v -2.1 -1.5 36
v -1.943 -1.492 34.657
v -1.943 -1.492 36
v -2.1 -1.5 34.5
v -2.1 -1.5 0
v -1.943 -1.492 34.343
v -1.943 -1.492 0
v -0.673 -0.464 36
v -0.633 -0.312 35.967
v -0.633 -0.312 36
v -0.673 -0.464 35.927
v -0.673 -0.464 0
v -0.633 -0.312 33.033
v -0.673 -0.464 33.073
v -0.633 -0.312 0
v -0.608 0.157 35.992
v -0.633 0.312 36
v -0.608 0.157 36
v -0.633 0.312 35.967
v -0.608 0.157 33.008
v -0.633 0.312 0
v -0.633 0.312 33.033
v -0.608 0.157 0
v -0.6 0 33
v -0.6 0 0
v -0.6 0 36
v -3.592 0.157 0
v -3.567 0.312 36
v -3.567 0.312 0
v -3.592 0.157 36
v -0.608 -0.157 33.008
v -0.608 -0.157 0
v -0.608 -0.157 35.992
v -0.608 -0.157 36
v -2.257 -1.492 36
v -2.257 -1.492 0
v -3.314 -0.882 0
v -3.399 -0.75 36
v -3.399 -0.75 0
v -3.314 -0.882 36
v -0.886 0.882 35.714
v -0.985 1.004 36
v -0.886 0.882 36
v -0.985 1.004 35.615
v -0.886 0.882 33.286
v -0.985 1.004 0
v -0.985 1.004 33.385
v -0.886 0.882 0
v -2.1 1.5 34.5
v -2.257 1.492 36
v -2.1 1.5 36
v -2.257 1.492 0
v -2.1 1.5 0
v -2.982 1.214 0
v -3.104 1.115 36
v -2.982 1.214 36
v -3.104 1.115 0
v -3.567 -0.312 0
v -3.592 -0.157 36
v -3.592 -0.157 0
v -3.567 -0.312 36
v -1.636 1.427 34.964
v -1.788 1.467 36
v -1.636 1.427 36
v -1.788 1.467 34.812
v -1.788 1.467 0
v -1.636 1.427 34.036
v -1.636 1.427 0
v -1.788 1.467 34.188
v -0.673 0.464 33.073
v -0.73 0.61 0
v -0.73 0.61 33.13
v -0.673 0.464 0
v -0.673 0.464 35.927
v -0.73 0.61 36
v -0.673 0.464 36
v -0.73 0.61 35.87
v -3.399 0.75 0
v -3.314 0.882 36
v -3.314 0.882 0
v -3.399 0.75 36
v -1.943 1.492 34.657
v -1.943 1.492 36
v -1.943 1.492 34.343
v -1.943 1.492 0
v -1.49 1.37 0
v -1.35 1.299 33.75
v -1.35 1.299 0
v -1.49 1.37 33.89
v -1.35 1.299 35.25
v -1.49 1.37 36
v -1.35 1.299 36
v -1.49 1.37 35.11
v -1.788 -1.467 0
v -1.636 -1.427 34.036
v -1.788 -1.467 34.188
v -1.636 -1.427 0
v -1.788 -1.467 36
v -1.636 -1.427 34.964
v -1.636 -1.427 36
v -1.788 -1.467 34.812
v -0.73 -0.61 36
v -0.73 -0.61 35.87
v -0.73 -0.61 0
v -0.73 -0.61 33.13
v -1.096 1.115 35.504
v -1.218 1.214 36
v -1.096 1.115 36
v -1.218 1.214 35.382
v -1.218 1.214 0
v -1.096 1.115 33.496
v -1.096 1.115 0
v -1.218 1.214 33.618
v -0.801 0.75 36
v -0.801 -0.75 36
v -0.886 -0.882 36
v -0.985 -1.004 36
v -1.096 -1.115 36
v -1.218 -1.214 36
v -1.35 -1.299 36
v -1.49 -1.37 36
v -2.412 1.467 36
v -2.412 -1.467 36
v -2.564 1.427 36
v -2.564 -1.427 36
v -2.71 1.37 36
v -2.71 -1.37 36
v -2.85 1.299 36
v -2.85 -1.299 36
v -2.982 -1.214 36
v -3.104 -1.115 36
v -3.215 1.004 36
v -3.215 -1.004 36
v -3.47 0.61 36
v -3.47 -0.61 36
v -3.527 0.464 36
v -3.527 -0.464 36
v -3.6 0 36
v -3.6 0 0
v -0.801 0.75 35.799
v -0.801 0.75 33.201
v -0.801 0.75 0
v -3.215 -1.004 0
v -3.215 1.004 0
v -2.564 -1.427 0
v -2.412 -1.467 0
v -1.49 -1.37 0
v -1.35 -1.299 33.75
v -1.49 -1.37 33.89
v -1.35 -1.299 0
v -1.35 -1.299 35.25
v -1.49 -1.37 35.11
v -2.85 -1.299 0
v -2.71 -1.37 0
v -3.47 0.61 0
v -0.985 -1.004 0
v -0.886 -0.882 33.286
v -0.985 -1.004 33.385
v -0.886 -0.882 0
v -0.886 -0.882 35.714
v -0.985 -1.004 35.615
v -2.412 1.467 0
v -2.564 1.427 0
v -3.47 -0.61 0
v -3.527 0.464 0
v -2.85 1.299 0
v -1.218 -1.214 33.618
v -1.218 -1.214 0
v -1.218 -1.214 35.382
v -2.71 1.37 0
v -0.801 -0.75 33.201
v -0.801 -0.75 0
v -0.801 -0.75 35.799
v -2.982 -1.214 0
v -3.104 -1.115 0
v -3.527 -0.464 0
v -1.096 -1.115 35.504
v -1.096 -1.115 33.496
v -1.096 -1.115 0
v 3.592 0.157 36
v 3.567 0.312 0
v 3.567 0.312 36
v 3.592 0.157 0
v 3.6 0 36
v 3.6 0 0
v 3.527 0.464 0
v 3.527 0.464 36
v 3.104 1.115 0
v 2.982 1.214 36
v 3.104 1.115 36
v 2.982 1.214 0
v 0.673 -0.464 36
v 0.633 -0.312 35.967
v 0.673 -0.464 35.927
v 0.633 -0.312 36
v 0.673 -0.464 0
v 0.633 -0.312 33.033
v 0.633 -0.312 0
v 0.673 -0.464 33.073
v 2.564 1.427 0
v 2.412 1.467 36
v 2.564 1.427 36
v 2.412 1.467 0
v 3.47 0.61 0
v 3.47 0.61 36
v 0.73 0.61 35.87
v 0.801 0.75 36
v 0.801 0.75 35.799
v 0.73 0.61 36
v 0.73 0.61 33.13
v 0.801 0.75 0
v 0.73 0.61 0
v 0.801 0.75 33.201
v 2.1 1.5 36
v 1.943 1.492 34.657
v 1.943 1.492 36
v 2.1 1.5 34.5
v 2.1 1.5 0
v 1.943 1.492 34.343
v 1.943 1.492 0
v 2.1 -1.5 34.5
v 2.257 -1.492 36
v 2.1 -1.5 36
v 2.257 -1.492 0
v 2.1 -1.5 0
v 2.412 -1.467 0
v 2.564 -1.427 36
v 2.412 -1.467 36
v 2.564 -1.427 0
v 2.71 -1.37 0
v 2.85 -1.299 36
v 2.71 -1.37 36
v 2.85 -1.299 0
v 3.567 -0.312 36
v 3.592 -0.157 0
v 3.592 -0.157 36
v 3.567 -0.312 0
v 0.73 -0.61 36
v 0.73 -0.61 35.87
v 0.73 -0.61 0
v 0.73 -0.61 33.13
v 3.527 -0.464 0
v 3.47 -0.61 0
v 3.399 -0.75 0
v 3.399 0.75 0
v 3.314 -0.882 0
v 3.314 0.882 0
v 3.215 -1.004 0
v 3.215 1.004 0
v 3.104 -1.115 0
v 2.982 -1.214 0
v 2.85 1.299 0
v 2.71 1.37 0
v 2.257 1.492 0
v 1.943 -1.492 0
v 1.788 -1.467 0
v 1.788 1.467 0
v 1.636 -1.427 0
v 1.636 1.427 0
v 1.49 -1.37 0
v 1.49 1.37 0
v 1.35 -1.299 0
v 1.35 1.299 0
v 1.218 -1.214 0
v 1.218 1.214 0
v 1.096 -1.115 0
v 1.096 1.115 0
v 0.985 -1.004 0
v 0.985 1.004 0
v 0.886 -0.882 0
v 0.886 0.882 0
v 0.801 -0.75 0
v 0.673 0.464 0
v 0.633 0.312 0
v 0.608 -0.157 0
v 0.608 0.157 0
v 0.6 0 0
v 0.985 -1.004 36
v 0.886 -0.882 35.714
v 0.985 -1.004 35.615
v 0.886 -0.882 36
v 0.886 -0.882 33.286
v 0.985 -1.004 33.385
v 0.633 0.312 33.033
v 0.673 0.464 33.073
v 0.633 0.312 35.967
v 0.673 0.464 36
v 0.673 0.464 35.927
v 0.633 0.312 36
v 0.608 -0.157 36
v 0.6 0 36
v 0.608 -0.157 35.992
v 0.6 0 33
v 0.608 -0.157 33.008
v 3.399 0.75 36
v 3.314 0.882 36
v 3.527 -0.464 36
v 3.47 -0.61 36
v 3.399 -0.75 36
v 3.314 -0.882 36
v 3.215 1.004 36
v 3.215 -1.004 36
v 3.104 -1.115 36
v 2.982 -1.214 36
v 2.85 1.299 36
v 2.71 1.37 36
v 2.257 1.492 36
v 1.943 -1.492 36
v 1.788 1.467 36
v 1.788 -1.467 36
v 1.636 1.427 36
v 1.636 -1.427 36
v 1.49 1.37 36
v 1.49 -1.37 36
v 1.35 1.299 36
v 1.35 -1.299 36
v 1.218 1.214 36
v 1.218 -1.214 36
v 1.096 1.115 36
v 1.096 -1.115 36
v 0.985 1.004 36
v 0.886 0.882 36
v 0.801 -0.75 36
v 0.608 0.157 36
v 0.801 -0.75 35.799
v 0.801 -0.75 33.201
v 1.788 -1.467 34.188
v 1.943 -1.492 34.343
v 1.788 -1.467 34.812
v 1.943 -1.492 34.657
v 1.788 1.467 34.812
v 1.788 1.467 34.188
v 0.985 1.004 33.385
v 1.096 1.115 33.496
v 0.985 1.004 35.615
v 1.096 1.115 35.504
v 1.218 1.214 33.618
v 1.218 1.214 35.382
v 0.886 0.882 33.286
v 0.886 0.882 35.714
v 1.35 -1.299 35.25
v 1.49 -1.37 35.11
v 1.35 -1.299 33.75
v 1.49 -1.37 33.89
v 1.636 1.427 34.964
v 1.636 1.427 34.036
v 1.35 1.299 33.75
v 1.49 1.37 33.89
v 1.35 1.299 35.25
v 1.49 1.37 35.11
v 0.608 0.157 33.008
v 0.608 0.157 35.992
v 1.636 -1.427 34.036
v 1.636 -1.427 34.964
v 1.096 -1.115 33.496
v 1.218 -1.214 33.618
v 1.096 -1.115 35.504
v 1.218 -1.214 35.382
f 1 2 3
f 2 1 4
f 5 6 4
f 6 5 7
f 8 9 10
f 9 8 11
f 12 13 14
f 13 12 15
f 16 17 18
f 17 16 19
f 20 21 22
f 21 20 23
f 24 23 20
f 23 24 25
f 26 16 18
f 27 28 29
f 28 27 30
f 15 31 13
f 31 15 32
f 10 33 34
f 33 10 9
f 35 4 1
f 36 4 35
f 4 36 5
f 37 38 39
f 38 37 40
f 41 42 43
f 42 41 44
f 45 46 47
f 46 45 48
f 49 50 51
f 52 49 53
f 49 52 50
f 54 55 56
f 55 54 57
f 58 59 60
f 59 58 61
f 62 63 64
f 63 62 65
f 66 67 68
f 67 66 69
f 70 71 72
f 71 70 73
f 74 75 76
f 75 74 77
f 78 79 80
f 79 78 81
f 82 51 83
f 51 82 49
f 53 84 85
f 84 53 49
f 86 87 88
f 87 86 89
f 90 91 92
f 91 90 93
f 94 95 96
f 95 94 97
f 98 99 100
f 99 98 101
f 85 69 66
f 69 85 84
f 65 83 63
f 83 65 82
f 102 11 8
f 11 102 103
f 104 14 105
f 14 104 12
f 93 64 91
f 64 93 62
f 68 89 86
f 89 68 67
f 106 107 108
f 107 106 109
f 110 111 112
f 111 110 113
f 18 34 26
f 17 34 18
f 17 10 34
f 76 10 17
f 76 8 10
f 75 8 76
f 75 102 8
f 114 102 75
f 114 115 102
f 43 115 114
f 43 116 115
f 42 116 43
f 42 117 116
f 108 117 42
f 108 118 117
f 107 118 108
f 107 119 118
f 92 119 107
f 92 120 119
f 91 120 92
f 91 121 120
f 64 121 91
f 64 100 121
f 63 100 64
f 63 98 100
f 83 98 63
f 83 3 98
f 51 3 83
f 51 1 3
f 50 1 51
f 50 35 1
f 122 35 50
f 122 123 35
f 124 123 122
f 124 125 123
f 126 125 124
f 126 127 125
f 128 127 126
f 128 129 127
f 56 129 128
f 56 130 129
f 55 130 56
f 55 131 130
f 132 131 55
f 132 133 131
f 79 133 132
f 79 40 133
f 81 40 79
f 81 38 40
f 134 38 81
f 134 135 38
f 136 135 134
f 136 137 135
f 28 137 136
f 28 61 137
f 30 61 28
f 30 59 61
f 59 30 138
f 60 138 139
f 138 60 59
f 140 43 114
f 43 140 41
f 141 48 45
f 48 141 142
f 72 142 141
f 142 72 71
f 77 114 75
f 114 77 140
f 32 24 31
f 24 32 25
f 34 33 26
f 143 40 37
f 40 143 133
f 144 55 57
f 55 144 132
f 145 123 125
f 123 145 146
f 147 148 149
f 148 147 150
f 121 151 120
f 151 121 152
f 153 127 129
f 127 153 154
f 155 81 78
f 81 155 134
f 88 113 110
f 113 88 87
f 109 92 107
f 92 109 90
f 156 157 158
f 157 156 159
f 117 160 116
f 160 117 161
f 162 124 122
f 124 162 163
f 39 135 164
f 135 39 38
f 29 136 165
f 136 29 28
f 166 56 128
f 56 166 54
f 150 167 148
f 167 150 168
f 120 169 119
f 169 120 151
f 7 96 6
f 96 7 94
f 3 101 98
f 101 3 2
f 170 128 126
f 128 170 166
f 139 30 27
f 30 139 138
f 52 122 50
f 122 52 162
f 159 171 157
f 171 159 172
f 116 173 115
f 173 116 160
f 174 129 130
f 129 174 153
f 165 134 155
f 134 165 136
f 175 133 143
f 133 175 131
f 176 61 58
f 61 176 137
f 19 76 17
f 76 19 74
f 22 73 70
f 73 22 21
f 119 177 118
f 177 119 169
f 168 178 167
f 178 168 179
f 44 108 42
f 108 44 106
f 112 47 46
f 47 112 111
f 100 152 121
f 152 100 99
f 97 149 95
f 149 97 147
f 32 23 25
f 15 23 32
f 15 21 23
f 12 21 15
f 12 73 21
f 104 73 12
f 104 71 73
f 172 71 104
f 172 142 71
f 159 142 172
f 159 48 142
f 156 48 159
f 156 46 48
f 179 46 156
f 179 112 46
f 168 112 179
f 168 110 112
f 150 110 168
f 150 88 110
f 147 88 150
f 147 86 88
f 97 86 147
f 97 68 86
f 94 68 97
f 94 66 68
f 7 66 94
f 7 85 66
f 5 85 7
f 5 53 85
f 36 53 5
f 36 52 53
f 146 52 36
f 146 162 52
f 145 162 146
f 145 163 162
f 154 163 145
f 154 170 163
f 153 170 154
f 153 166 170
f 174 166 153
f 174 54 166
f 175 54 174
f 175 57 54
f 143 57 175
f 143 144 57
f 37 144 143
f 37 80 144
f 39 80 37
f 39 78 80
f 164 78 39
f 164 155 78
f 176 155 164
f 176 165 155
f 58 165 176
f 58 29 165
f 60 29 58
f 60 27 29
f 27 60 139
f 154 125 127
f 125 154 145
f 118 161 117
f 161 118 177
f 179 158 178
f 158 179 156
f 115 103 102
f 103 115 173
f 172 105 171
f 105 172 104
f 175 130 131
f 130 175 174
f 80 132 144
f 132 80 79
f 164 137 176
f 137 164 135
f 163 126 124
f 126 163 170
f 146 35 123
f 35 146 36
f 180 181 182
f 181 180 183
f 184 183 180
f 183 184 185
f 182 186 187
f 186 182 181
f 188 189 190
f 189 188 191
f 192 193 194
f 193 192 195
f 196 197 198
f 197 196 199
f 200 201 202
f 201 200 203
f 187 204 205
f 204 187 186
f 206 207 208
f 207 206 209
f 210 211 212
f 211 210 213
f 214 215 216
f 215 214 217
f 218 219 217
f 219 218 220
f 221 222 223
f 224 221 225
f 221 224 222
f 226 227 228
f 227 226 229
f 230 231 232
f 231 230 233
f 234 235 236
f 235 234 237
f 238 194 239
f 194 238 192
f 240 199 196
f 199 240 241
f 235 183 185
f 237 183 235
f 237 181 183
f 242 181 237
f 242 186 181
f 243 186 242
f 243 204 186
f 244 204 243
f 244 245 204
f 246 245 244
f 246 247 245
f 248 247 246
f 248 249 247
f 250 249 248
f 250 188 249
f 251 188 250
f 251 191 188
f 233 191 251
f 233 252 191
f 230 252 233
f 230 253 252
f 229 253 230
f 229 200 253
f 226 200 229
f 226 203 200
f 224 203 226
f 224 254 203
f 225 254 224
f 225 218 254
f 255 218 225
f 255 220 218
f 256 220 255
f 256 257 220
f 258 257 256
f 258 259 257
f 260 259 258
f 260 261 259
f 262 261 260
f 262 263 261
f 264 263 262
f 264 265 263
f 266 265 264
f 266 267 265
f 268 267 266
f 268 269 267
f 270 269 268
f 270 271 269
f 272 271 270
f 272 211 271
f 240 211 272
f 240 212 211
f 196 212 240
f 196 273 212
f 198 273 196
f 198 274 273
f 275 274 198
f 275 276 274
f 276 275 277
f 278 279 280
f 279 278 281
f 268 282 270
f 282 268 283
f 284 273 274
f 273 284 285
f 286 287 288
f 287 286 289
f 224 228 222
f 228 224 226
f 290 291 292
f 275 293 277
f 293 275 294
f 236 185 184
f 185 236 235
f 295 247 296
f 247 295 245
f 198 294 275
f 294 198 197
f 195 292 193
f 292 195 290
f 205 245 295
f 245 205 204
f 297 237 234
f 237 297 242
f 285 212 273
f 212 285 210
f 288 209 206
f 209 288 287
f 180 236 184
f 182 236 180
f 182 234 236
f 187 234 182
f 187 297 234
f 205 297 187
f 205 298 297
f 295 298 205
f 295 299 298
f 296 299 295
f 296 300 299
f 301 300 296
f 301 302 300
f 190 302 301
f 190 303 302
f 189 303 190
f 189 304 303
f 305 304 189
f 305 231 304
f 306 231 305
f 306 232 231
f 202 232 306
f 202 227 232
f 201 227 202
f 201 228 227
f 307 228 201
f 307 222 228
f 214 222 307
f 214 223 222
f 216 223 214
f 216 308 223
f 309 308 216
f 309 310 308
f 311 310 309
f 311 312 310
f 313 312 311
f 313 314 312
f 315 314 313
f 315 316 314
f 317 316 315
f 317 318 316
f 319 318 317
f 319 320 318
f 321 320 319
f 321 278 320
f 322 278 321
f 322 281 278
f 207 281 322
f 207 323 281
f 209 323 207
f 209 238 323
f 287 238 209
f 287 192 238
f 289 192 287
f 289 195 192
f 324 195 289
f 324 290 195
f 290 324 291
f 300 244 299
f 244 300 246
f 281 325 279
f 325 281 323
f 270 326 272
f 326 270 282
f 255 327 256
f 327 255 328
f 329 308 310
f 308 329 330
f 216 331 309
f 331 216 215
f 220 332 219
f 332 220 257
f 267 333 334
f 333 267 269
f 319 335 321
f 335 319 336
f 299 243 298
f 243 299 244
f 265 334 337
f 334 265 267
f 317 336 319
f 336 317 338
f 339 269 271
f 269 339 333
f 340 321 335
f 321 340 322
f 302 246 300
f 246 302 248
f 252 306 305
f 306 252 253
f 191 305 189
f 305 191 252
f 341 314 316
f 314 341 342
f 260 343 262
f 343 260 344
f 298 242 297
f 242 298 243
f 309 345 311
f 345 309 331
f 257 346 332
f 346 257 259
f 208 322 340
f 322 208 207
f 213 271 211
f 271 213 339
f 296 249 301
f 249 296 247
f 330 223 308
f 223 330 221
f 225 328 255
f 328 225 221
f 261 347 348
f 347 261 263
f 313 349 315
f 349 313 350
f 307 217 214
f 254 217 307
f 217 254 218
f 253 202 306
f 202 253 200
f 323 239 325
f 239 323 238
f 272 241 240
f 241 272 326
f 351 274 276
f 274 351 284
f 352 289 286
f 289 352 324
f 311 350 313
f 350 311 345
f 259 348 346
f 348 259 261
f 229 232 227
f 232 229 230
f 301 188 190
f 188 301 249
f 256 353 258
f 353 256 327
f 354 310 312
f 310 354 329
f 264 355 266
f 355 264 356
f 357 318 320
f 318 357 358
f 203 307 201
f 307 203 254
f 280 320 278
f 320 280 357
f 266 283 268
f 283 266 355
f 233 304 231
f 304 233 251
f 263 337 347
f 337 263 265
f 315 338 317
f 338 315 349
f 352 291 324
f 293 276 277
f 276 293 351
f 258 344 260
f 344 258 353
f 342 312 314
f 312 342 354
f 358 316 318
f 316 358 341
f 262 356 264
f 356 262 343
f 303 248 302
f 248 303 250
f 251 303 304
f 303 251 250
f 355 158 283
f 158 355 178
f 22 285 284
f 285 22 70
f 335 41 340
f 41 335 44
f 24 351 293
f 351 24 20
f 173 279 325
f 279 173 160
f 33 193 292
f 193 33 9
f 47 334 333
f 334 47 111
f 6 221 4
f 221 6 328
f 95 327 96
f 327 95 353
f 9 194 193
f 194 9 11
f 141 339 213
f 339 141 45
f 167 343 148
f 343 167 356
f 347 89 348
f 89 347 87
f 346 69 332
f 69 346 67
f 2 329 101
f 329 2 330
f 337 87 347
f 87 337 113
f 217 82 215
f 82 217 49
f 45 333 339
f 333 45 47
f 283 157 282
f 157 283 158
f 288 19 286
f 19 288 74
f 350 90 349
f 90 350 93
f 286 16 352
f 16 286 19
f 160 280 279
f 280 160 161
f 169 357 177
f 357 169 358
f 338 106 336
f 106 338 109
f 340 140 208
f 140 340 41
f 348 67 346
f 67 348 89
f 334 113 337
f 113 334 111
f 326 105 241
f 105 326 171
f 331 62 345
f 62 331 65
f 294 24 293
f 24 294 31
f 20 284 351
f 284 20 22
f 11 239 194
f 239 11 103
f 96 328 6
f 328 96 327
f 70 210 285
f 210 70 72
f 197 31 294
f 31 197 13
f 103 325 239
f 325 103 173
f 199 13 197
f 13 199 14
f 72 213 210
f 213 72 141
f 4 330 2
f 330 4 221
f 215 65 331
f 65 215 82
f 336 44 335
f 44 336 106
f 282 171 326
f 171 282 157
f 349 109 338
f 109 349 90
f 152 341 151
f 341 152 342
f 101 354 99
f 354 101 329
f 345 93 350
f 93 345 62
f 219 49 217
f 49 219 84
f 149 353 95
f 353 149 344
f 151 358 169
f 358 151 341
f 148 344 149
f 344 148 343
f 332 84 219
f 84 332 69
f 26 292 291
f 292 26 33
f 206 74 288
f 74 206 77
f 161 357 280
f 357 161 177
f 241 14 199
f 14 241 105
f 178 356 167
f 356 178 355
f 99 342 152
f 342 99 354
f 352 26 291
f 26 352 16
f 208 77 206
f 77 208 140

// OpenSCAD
// Two-prong cotter pin.
$fn = 60;
eps = 0.02;
wire_d = 3;
length = 36;
prong_gap = wire_d*1.4;
union() {
    translate([-prong_gap/2,0,0]) cylinder(d=wire_d,h=length);
    translate([prong_gap/2,0,0]) cylinder(d=wire_d,h=length);
    translate([-prong_gap/2,0,length-wire_d/2]) rotate([0,90,0]) cylinder(d=wire_d,h=prong_gap);
}
